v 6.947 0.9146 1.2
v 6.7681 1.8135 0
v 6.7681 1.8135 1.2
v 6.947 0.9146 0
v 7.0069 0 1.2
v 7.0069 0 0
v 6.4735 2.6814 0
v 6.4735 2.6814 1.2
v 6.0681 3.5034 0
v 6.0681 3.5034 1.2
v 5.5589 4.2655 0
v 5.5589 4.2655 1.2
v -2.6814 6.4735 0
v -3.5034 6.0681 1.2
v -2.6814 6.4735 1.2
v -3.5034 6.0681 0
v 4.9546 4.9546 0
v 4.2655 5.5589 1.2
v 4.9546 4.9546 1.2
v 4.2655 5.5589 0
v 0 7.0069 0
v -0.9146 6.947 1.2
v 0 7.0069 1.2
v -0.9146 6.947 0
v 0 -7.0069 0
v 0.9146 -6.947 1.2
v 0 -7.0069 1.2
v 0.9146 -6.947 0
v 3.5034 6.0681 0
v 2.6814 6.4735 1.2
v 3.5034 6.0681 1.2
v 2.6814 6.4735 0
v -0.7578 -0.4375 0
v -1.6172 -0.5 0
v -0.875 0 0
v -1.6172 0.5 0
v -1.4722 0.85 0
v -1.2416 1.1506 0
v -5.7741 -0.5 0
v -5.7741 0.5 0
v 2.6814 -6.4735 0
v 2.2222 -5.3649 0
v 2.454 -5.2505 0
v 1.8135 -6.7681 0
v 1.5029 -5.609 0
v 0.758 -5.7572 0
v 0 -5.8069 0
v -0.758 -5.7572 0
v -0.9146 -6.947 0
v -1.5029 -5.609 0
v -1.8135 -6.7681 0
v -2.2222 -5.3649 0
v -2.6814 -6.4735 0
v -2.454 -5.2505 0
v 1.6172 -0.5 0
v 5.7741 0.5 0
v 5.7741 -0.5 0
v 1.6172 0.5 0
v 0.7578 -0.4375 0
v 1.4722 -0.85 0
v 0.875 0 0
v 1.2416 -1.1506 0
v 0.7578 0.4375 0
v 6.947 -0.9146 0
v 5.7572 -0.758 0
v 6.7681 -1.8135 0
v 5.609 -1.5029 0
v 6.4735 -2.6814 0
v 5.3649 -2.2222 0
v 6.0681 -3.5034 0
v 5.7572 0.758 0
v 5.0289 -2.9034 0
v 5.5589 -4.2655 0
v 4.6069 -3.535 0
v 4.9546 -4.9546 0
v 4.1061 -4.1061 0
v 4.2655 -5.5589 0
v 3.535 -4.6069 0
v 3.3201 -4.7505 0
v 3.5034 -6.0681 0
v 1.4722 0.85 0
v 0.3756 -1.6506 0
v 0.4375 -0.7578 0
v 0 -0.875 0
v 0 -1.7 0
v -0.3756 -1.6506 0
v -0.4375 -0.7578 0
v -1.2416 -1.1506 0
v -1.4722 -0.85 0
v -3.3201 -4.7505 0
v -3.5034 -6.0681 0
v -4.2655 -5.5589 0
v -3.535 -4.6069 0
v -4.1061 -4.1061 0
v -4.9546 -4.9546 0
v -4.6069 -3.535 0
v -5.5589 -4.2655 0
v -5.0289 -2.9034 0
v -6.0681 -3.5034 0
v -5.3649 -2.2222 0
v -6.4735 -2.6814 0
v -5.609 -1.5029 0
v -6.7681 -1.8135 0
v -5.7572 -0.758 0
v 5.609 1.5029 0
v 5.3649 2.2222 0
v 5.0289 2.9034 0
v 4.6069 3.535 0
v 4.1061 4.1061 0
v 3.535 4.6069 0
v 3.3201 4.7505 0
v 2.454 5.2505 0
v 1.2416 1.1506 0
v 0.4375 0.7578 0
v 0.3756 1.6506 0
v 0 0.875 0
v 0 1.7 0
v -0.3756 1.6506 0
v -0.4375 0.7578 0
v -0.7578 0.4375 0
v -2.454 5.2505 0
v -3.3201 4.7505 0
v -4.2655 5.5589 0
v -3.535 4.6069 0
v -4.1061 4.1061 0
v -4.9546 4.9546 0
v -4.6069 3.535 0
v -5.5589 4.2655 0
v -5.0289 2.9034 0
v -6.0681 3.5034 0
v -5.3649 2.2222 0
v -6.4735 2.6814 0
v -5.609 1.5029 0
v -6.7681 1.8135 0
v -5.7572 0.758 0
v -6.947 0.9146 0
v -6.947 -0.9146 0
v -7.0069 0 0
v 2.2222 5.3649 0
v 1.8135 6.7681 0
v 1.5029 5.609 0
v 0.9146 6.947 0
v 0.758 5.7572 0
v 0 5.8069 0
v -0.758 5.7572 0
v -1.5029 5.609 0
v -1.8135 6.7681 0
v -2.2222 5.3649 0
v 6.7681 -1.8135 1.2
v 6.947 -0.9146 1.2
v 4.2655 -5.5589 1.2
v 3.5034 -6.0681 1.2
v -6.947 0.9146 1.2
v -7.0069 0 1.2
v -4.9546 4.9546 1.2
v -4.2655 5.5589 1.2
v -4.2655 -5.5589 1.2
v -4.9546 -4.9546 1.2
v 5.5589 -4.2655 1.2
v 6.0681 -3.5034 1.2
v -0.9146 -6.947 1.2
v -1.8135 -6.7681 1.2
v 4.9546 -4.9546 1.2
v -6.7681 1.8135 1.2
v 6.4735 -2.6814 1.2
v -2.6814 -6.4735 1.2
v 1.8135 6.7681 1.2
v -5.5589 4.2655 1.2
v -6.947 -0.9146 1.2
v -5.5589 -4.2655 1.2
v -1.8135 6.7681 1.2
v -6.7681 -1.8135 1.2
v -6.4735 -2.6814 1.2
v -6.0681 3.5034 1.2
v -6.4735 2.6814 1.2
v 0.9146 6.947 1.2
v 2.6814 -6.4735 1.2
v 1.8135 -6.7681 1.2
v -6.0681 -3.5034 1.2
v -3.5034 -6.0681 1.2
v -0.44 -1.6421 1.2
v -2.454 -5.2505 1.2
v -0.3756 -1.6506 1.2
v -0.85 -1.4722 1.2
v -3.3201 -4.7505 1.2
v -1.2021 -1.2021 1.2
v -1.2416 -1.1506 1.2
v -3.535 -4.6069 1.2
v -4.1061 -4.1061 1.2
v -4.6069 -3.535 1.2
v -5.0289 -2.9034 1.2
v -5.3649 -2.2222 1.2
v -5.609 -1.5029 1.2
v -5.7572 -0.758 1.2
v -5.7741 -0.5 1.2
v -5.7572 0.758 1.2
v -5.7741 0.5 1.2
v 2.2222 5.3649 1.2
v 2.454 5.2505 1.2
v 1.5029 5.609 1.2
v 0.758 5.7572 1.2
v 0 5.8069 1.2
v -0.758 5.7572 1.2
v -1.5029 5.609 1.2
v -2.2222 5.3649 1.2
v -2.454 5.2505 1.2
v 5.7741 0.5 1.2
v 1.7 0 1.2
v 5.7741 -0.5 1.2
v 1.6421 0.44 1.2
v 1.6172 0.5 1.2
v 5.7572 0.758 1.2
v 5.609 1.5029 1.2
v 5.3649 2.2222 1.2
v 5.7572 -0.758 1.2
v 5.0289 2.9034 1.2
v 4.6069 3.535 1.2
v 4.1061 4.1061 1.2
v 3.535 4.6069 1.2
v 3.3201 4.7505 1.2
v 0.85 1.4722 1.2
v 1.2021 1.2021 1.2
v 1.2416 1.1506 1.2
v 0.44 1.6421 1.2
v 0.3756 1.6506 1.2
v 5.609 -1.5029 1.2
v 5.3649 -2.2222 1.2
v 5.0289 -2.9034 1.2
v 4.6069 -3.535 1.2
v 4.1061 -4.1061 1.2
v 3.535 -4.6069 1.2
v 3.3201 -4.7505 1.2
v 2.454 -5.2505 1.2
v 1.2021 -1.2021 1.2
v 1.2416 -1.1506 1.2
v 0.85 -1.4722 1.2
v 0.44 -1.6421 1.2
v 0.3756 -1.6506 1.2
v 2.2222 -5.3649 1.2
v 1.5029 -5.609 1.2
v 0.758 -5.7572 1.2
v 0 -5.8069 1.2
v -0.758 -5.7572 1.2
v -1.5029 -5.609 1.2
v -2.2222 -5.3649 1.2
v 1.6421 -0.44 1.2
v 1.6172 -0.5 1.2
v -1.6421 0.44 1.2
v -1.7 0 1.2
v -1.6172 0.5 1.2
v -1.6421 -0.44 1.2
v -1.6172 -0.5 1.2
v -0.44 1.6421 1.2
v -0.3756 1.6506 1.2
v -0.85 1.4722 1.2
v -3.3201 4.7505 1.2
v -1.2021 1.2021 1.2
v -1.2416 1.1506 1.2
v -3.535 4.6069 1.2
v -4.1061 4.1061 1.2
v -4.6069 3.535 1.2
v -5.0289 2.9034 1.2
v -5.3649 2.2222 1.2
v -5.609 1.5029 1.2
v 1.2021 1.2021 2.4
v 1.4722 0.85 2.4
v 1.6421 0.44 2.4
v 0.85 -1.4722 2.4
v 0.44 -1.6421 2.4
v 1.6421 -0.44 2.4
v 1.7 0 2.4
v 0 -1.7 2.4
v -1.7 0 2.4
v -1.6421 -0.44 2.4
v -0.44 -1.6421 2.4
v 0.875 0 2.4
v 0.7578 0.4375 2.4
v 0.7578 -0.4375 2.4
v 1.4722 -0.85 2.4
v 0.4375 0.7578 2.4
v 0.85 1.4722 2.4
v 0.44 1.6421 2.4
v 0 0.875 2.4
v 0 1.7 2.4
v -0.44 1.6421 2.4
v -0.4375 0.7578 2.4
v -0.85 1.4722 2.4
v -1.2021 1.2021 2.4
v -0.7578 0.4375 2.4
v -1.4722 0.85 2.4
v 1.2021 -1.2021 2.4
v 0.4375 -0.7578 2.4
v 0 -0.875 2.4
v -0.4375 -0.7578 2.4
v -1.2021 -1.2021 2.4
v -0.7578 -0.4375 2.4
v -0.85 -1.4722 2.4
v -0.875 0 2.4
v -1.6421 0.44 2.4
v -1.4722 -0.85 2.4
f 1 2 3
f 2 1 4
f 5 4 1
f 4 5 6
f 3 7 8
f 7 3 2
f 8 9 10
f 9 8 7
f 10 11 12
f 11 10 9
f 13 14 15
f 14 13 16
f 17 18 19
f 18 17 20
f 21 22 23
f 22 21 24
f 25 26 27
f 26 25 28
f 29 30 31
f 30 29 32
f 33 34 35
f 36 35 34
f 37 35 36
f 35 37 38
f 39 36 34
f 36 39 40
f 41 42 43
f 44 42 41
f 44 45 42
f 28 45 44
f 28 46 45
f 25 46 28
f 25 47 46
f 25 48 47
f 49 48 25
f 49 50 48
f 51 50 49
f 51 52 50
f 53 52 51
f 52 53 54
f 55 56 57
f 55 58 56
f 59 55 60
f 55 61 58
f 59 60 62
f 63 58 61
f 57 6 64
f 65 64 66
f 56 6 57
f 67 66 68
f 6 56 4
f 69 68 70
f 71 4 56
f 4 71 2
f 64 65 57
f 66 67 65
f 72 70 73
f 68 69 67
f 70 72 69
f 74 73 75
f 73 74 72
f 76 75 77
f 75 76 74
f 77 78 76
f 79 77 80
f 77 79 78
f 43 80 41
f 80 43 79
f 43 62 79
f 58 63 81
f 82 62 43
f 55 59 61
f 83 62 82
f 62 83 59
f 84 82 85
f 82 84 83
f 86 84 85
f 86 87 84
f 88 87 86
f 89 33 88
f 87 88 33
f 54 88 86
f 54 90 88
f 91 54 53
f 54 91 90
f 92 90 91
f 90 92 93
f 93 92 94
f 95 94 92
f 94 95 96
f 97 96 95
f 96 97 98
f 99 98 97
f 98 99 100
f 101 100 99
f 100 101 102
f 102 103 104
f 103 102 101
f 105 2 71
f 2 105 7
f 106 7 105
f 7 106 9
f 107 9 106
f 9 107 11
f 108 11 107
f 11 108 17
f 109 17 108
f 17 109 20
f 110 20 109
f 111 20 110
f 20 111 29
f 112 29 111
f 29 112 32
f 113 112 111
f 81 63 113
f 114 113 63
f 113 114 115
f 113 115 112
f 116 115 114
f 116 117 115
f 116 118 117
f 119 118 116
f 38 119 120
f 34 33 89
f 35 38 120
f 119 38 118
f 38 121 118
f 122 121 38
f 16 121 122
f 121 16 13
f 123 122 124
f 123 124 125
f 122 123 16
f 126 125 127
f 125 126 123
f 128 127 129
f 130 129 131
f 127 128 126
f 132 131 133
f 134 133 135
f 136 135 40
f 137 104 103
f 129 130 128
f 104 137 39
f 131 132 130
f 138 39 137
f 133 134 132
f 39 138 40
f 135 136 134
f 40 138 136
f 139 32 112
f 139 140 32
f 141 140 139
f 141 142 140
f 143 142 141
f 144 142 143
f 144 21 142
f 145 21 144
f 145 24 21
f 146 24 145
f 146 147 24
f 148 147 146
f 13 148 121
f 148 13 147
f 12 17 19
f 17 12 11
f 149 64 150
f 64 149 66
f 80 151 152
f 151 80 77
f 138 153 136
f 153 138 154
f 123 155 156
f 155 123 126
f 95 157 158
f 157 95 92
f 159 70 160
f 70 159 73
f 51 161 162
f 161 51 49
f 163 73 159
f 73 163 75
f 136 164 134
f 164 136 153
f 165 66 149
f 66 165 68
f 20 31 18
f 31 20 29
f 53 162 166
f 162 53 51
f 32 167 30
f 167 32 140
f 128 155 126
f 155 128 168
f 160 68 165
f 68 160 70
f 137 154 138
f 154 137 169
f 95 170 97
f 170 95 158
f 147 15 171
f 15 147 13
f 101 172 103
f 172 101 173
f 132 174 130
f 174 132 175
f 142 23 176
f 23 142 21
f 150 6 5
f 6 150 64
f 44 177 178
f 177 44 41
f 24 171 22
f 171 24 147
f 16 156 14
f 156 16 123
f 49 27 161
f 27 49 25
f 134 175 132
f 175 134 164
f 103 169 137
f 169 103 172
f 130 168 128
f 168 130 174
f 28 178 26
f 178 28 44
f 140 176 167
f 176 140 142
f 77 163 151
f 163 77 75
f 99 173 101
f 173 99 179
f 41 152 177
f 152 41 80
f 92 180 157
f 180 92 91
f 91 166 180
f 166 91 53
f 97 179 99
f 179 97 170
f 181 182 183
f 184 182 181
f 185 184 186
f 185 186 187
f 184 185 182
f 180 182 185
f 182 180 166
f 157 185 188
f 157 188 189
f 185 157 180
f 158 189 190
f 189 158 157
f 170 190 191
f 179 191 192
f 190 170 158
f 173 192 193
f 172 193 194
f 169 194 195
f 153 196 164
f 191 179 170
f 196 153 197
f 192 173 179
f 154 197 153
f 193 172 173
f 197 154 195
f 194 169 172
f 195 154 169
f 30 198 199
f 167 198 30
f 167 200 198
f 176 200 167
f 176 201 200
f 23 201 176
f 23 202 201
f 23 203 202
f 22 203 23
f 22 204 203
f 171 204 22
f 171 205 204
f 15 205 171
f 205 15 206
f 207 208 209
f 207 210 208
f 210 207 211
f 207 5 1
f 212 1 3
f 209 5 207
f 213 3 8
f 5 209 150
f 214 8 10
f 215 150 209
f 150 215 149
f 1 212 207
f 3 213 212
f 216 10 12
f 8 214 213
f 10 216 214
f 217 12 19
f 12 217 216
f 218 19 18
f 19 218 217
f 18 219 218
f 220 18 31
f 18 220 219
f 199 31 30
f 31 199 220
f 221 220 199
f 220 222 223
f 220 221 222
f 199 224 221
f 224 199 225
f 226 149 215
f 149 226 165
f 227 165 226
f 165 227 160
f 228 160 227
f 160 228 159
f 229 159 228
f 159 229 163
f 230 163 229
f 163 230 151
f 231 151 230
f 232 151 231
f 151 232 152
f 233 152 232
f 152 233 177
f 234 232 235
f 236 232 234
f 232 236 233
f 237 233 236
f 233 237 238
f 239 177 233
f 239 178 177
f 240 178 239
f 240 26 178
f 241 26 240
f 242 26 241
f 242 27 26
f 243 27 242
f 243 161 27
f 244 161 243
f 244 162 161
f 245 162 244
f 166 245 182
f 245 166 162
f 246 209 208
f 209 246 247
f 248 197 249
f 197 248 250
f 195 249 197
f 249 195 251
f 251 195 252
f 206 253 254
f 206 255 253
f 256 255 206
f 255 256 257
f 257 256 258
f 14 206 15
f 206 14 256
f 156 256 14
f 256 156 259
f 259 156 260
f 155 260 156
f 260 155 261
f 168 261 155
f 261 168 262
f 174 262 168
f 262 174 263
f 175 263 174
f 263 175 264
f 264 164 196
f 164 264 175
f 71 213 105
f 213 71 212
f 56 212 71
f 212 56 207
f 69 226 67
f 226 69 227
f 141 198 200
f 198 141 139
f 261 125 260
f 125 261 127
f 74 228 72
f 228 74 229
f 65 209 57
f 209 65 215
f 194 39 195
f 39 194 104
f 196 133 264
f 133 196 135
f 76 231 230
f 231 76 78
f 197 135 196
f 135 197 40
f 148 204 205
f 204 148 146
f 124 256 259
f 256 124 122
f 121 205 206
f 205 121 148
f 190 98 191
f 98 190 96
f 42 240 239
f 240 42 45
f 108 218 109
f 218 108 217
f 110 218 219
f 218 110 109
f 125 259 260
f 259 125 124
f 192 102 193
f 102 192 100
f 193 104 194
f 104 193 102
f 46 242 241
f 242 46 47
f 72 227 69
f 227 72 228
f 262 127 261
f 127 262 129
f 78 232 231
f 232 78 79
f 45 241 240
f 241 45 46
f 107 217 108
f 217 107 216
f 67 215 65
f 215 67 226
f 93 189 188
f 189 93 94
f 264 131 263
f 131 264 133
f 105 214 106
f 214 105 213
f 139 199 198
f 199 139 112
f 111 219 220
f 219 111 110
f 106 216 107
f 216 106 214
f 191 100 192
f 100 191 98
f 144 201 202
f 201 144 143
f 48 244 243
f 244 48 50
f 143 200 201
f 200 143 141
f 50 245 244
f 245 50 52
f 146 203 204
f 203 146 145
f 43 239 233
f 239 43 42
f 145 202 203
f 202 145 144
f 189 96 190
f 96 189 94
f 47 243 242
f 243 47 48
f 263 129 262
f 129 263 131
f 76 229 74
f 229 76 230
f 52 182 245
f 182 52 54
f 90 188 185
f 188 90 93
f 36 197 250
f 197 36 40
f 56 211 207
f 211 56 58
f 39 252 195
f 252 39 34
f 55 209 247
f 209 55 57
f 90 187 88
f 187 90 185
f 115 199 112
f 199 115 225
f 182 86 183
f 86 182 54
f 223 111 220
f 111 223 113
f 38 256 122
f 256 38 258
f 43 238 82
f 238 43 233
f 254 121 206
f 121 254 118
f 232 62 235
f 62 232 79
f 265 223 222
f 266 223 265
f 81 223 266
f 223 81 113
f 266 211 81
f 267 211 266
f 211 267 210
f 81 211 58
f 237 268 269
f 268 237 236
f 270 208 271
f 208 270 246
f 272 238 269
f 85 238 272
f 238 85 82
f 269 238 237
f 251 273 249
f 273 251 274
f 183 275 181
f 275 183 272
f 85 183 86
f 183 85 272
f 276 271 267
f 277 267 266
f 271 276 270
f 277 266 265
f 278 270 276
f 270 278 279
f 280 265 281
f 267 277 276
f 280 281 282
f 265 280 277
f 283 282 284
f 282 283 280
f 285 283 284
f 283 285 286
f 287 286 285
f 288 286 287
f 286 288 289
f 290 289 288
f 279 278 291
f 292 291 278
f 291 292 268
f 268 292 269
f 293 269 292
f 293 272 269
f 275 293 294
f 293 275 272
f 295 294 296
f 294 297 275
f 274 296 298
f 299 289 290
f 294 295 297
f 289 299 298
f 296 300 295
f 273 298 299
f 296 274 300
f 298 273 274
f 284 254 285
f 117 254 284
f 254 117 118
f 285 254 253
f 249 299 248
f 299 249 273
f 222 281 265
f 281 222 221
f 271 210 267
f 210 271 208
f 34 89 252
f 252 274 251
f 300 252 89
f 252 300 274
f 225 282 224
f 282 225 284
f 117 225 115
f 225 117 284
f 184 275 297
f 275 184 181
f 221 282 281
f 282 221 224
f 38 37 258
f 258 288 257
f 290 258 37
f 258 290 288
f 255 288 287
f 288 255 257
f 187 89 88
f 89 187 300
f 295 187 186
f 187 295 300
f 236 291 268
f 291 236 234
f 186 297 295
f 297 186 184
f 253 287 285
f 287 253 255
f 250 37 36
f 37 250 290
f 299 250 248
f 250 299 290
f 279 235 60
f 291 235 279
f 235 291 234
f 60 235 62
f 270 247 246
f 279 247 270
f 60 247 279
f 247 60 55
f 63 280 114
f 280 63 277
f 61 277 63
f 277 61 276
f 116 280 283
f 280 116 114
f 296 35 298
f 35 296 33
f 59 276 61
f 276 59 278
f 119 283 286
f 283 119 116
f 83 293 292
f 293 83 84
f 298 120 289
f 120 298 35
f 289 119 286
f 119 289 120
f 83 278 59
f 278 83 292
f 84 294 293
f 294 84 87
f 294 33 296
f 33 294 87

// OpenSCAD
// =====================================================================
//  VIEW 10: BRAKEWHEEL  -  print 2
//  Milwaukee Road 1939 rib side bay window caboose - G scale (1:29)
//  Brake wheel
//  Print orientation: flat
//
//  Open this file in OpenSCAD to look at just this part.
//  To export this part's STL: Render (F6), then File > Export > STL.
//  The part's code lives in library/brakewheel.scad; settings in
//  library/caboose_params.scad.
// =====================================================================

part     = "brakewheel";    // which part - leave as is
view     = "print";  // "print"     = laid out as it goes on the printer bed
                     //               (same as the exported STL)
                     // "installed" = in its place on the car (all copies)
show_car = false;    // with "installed": faint see-through body, roof and
                     //   underframe around it for context

include <../library/caboose_all.scad>

if (view == "installed") {
    caboose_installed(part);
    if (show_car) car_ghost();
} else {
    caboose_print(part);
}
echo(str("brakewheel: print 2"));
